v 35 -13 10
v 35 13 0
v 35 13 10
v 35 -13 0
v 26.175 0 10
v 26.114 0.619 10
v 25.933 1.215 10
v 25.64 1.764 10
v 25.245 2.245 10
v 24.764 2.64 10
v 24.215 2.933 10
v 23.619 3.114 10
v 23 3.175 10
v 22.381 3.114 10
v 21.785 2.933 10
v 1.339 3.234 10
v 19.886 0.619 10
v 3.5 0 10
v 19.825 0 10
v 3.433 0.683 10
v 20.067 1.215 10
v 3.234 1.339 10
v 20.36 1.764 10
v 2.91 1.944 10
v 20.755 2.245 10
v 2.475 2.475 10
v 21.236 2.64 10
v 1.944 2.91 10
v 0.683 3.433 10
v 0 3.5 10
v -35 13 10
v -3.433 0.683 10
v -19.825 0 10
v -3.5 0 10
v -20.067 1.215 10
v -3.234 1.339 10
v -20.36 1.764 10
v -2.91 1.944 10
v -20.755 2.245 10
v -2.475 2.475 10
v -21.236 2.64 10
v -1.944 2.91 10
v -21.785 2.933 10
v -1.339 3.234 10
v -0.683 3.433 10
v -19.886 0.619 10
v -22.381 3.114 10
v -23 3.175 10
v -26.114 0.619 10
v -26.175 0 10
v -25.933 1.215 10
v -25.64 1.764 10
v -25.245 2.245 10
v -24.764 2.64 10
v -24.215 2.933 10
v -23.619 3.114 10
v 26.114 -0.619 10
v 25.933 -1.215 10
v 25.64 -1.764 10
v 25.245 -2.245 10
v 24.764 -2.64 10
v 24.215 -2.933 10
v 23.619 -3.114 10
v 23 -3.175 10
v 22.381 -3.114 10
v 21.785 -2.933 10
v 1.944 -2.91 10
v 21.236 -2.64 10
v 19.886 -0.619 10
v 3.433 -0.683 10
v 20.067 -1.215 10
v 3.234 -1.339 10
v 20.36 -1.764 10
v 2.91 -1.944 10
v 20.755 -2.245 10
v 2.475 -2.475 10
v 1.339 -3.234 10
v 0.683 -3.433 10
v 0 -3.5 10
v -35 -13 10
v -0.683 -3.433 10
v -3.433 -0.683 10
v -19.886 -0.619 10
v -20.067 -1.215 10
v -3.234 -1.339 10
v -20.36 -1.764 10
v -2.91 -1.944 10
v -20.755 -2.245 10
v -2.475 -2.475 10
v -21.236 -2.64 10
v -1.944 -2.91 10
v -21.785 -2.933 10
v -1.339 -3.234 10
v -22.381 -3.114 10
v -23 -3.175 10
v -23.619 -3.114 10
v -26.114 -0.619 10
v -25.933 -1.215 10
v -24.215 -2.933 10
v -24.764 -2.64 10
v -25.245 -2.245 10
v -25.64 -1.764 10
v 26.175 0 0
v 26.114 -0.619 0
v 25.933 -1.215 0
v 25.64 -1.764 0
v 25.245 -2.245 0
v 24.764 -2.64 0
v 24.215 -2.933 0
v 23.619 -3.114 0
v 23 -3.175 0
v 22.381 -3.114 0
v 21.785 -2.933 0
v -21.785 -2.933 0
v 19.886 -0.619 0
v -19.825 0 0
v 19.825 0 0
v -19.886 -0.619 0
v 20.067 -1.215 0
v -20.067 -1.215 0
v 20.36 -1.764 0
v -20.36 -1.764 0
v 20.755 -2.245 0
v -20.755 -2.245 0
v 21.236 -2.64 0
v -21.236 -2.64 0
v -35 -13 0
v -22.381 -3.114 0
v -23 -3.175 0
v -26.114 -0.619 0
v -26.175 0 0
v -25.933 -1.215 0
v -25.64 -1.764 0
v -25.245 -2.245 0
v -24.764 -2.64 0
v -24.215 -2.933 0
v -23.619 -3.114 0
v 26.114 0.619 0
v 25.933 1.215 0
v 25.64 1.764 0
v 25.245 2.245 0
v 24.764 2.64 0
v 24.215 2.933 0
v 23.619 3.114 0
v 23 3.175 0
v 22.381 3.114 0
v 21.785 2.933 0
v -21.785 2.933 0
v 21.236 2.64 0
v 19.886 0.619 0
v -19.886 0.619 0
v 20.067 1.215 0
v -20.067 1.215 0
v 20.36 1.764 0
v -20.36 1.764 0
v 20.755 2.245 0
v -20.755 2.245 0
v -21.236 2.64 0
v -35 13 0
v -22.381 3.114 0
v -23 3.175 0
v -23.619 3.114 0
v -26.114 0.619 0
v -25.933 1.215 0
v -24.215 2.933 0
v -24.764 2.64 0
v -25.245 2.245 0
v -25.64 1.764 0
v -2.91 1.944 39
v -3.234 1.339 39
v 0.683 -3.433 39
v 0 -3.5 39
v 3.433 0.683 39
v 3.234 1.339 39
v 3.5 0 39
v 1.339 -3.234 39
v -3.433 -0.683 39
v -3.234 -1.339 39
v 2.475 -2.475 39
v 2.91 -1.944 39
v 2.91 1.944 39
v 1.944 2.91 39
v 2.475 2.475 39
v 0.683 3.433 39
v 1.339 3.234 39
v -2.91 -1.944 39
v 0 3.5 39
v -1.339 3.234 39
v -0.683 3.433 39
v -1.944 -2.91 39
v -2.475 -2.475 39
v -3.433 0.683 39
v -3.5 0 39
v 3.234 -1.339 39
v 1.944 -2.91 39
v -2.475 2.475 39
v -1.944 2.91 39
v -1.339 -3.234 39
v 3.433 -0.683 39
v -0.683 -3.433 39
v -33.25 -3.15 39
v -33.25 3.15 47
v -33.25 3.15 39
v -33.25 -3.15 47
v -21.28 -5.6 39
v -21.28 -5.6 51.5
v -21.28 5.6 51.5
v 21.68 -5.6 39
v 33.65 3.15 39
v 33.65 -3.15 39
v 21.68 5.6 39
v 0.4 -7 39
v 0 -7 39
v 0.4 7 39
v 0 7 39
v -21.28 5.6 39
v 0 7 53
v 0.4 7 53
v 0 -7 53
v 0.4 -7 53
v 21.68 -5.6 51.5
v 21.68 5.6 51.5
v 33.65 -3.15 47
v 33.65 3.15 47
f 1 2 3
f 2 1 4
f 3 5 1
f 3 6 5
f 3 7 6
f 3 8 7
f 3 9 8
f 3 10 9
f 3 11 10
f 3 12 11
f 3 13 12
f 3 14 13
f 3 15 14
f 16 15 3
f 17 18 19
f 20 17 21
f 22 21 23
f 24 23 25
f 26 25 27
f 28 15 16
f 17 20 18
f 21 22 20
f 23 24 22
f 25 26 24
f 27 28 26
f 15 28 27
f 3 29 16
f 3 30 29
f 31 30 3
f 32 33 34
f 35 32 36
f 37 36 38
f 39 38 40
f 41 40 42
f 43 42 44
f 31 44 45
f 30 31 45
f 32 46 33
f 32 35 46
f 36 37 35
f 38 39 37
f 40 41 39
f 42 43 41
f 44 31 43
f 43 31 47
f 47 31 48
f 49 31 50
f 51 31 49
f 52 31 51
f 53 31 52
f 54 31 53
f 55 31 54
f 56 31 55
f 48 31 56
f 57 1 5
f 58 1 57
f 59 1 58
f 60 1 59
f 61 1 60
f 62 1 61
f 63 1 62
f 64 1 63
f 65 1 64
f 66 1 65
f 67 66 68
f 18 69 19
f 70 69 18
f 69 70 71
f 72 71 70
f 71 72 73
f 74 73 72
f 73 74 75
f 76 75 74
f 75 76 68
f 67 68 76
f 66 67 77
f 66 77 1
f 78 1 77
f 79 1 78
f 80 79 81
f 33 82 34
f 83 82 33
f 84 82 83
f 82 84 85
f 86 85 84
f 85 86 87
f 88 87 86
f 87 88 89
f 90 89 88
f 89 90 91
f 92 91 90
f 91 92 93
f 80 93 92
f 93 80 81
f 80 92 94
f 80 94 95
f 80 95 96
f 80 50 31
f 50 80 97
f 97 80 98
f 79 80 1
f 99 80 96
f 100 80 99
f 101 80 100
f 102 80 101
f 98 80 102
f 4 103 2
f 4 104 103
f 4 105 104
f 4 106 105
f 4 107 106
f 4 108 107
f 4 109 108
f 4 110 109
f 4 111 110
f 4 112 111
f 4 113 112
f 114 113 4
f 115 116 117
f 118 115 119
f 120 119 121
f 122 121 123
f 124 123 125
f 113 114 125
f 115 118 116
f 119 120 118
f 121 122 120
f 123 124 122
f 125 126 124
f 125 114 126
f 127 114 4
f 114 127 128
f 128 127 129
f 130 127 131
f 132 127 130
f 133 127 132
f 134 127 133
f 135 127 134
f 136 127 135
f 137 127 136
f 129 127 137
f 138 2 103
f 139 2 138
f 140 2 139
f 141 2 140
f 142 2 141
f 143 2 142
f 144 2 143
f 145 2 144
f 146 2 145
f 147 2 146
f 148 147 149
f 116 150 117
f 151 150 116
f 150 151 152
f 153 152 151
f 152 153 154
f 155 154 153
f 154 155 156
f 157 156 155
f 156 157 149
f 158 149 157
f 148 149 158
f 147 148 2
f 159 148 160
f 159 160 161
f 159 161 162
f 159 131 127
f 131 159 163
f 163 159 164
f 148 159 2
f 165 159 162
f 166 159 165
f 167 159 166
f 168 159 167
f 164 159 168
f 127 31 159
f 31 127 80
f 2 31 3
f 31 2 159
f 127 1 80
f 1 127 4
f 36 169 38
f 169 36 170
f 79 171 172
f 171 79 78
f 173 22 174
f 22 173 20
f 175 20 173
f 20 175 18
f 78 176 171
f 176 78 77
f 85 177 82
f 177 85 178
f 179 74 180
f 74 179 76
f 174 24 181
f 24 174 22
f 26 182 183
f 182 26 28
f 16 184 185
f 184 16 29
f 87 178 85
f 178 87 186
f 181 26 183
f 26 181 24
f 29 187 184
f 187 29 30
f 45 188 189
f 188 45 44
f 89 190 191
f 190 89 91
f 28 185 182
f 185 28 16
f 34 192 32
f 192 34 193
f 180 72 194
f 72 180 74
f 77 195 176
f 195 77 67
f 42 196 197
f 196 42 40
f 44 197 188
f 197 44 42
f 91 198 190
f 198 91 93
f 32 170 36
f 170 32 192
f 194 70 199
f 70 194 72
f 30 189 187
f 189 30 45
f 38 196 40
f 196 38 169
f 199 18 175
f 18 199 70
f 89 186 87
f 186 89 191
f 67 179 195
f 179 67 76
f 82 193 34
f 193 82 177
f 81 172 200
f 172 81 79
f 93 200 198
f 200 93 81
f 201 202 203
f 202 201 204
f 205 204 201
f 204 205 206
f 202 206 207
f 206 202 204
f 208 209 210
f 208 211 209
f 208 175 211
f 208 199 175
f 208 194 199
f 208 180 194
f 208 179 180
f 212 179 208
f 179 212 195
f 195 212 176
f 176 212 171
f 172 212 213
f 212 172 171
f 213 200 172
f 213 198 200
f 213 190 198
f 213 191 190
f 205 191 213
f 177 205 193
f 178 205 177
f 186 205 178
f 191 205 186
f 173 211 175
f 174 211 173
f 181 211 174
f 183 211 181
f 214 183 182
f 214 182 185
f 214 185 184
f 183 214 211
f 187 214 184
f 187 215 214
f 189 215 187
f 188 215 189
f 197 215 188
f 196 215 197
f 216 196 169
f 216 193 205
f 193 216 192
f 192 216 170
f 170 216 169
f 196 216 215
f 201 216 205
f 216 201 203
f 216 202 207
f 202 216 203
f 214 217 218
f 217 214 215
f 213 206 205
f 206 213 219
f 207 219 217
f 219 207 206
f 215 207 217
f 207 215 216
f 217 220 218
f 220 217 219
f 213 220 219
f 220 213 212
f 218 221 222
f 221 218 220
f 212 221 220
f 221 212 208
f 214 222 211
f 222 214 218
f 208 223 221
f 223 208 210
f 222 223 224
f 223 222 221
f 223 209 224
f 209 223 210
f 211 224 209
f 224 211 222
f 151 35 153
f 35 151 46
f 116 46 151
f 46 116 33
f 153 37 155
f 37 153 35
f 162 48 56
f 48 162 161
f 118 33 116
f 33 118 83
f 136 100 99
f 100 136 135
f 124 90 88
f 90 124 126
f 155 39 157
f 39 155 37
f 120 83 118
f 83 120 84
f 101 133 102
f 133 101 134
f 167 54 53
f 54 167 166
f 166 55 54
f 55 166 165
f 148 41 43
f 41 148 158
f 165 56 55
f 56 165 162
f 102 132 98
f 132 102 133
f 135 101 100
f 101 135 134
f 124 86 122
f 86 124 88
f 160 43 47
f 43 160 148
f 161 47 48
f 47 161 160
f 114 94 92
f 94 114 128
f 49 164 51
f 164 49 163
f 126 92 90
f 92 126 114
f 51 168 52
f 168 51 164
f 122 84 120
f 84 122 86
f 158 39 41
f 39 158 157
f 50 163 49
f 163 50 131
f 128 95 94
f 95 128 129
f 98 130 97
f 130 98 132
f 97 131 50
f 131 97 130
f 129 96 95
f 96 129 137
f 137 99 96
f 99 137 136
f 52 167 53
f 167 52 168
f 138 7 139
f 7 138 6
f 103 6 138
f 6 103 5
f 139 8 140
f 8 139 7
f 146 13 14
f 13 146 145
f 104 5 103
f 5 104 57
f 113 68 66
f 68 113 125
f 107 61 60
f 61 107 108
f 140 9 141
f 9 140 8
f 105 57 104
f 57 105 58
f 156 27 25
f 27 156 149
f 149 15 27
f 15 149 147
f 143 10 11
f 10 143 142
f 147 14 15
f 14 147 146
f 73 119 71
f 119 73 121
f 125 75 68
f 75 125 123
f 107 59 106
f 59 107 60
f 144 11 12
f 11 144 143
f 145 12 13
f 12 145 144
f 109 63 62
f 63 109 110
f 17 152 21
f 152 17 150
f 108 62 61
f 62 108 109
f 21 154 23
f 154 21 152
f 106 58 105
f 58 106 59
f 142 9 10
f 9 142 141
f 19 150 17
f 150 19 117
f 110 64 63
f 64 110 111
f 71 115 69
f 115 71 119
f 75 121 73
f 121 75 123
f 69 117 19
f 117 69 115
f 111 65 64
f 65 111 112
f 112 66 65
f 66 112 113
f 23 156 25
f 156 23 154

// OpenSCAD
$fn = 32;

// ----------------------------------------------------------------------
// Boat cleat: 70 mm base, horn 46 mm up
// ----------------------------------------------------------------------

// --- parameters (mm) ---
base_l = 70;              // base length
base_w = 26;              // base width
base_t = 10;              // base thickness
horn_len = 66.5;          // horn length
horn_d = 14;              // horn diameter at the middle
horn_z = 46;              // horn axis height
end_drop = 6;             // how far the horn tips drop
post_d = 7;               // centre post diameter
holes_d = 6.35;           // fixing holes
hole_x = 23;              // fixing hole spacing

difference() {
  union() {
    translate([-35, -13, 0]) cube([base_l, base_w, base_t]);
    /* centre post, sunk 1 mm into the base */
    translate([0, 0, 9]) cylinder(h = 37, d = post_d);
    /* horn: a hull chain of boxes, full in the middle and lighter at the tips */
    hull() {
      translate([-33.25, -3.15, 39]) cube([0.4, 6.3, 8], center = false);
      translate([-21.28, -5.6, 39]) cube([0.4, 11.2, 12.5], center = false);
    }
    hull() {
      translate([-21.28, -5.6, 39]) cube([0.4, 11.2, 12.5], center = false);
      translate([0, -7, 39]) cube([0.4, 14, 14], center = false);
    }
    hull() {
      translate([0, -7, 39]) cube([0.4, 14, 14], center = false);
      translate([21.28, -5.6, 39]) cube([0.4, 11.2, 12.5], center = false);
    }
    hull() {
      translate([21.28, -5.6, 39]) cube([0.4, 11.2, 12.5], center = false);
      translate([33.25, -3.15, 39]) cube([0.4, 6.3, 8], center = false);
    }
  }
  translate([-23, 0, -2.5]) cylinder(h = base_t + 5, d = holes_d);
  translate([23, 0, -2.5]) cylinder(h = base_t + 5, d = holes_d);
}
